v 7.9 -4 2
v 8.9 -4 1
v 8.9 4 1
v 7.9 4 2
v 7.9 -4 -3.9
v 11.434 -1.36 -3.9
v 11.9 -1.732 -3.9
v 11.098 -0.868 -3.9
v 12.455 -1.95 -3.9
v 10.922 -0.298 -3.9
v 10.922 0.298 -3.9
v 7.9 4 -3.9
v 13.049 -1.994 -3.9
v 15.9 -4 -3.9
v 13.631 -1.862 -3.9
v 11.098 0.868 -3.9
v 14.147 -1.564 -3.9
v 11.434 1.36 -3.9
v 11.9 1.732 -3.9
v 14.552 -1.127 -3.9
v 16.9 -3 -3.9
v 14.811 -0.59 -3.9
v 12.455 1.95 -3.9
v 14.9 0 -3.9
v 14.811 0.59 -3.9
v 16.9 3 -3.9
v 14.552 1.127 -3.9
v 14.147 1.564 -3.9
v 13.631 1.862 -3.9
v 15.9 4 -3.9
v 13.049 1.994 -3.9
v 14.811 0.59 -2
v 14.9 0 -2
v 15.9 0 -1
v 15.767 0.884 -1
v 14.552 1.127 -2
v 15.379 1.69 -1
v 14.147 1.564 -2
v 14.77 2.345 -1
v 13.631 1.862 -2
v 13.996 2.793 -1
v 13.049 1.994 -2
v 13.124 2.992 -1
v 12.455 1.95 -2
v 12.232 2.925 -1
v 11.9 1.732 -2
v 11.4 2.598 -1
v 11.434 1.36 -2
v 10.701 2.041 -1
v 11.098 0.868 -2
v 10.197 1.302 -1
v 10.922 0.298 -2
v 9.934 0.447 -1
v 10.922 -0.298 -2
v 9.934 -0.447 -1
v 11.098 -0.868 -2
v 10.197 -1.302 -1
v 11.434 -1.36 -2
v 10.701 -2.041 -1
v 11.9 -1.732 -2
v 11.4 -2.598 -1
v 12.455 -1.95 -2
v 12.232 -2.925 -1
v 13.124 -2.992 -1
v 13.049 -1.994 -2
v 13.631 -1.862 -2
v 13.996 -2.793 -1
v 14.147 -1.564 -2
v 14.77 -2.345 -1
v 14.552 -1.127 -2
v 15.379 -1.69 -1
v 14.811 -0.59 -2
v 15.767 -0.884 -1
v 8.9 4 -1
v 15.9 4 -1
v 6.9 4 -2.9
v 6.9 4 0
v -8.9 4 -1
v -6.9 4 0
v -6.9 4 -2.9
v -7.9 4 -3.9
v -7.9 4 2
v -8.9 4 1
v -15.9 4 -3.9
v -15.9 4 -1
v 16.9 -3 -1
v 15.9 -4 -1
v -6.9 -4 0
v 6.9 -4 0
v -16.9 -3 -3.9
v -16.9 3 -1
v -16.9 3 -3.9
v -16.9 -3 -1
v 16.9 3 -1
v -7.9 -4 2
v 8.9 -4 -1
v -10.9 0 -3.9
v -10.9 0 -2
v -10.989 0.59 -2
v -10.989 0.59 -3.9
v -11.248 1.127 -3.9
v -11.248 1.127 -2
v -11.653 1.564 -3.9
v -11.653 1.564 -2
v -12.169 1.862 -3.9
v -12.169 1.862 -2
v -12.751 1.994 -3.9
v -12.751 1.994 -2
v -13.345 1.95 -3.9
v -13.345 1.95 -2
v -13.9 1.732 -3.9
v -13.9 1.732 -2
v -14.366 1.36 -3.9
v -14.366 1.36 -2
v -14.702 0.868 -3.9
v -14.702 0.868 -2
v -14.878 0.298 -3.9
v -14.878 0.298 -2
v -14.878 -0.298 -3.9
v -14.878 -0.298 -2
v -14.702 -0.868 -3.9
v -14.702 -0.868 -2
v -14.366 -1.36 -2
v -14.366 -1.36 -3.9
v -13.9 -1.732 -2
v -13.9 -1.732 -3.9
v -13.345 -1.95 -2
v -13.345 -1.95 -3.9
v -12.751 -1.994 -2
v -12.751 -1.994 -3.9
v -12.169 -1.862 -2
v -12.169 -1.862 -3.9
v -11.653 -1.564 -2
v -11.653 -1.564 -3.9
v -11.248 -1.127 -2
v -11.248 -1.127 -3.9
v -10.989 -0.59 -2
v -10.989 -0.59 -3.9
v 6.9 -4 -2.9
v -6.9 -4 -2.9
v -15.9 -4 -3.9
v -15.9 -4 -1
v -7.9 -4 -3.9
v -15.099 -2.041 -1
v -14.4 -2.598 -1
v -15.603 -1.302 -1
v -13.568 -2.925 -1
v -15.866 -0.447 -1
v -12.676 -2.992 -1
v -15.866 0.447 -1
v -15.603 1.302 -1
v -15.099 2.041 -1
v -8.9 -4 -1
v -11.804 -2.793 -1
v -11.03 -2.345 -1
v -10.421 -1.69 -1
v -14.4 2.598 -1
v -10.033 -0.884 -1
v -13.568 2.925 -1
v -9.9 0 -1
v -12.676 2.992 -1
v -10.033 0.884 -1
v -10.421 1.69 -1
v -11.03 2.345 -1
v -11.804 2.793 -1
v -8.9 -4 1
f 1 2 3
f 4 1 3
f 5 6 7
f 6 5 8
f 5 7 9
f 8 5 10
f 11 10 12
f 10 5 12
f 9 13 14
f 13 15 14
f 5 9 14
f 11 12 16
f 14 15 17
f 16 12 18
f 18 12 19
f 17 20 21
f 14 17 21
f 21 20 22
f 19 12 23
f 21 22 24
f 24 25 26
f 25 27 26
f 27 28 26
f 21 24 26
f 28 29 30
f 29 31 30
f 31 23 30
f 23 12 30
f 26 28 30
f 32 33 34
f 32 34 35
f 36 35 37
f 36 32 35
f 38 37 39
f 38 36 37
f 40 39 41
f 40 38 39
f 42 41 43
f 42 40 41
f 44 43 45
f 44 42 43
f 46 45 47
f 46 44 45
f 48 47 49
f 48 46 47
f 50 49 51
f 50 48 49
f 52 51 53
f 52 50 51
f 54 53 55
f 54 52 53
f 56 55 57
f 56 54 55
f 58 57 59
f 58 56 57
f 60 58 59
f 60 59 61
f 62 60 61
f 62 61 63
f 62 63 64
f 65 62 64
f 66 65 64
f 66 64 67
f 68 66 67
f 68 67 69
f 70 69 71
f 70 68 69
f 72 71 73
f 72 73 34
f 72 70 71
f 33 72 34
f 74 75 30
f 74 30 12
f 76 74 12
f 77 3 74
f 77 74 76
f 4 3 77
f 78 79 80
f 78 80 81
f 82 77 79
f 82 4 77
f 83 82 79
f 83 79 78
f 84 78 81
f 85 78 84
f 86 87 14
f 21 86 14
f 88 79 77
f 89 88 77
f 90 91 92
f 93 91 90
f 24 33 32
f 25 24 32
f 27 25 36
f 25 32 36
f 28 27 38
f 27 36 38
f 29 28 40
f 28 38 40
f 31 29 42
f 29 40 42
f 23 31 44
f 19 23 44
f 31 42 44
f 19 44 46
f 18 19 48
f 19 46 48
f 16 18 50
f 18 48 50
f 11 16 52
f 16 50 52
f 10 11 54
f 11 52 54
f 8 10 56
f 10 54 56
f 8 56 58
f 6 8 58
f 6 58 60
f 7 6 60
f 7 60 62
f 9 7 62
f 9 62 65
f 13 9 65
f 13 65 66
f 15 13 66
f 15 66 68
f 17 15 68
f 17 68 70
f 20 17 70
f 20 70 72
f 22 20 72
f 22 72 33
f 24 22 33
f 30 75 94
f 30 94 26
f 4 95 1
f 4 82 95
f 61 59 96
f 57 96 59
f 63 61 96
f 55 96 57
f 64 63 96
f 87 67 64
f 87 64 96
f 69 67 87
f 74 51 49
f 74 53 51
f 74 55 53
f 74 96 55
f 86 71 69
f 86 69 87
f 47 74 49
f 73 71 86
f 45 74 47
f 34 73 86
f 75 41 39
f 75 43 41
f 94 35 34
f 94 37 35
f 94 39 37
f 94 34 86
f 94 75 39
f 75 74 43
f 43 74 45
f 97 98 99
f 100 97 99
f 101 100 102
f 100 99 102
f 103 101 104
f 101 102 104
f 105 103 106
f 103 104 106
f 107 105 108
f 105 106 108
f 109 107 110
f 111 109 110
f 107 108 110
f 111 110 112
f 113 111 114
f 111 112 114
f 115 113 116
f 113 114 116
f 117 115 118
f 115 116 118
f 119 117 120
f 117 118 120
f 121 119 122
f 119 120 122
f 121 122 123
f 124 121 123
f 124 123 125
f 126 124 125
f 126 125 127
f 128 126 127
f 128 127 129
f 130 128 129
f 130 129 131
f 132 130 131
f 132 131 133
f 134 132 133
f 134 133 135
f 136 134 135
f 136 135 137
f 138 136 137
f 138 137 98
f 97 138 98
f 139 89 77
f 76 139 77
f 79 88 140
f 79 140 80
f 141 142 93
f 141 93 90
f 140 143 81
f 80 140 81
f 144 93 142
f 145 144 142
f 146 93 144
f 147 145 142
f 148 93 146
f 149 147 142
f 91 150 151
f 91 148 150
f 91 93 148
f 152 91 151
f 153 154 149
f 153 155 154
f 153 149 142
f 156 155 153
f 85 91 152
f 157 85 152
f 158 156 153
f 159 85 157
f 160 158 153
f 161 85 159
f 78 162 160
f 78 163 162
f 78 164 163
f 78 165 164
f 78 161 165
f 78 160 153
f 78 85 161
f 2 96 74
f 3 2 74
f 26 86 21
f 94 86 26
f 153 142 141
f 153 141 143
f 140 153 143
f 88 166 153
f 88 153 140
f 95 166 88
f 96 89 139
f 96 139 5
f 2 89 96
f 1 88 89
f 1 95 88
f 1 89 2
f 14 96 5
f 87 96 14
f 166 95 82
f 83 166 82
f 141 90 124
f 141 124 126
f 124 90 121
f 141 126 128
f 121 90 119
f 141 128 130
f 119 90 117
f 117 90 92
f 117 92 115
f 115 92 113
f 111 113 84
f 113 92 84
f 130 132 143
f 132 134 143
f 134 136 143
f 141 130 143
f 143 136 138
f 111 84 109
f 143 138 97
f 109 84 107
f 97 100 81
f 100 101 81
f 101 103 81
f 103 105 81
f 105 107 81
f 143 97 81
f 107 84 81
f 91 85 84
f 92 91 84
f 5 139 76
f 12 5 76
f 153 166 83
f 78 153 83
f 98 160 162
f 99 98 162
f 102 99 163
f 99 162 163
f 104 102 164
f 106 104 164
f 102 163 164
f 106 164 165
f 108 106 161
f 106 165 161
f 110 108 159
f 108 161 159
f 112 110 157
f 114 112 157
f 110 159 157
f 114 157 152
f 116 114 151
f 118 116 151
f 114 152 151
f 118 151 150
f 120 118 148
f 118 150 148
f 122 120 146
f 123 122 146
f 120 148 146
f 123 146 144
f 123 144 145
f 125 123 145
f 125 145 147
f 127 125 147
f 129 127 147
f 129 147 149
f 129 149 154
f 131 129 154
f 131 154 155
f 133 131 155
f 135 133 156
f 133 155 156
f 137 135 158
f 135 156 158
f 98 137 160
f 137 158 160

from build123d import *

# Parameters (mm, degrees)
F0_W     = 2
F0_H     = 8
F0_W_2   = 13.8
F1_DEPTH = 2
F0_R     = 2
F2_DEPTH = 3.9
F3_DEPTH = 1
F4_SIZE  = 1


with BuildPart() as f1:
    # F0 (on Top) → F1 (new body)
    with BuildSketch(Plane.XY):
        with Locations((-7.9, 0)):
            Rectangle(F0_W, F0_H)
        Rectangle(F0_W_2, F0_H)
        with Locations((7.9, 0)):
            Rectangle(F0_W, F0_H)
    extrude(amount=F1_DEPTH)

    # F0 (on Top) → F2 (join)
    with BuildSketch(Plane.XY):
        with Locations((-7.9, 0)):
            Rectangle(F0_W, F0_H)
        Polygon((-16.9, -4), (-8.9, -4), (-8.9, 4), (-16.9, 4), (-16.9, 0), align=None)
        with Locations((-12.9, 0)):
            Circle(F0_R, mode=Mode.SUBTRACT)
        with Locations((7.9, 0)):
            Rectangle(F0_W, F0_H)
        Polygon((8.9, 4), (8.9, -4), (16.9, -4), (16.9, 0), (16.9, 4), align=None)
        with Locations((12.9, 0)):
            Circle(F0_R, mode=Mode.SUBTRACT)
    extrude(amount=-F2_DEPTH)

    # F0 (on Top) → F3 (cut)
    with BuildSketch(Plane.XY):
        Polygon((-16.9, -4), (-8.9, -4), (-8.9, 4), (-16.9, 4), (-16.9, 0), align=None)
        with Locations((-12.9, 0)):
            Circle(F0_R, mode=Mode.SUBTRACT)
        Polygon((8.9, 4), (8.9, -4), (16.9, -4), (16.9, 0), (16.9, 4), align=None)
        with Locations((12.9, 0)):
            Circle(F0_R, mode=Mode.SUBTRACT)
    extrude(amount=-F3_DEPTH, mode=Mode.SUBTRACT)

    # F4
    f4_edges = [f1.edges().sort_by_distance(p)[0] for p in [
        (-8.9, 0, 2),
        (8.9, 0, 2),
        (-6.9, 0, -3.9),
        (-14.9, 0, -1),
        (10.9, 0, -1),
        (6.9, 0, -3.9),
        (-16.9, -4, -2.45),
        (-16.9, 4, -2.45),
        (16.9, -4, -2.45),
        (16.9, 4, -2.45),
    ]]
    chamfer(f4_edges, length=F4_SIZE)


solid = f1.part
